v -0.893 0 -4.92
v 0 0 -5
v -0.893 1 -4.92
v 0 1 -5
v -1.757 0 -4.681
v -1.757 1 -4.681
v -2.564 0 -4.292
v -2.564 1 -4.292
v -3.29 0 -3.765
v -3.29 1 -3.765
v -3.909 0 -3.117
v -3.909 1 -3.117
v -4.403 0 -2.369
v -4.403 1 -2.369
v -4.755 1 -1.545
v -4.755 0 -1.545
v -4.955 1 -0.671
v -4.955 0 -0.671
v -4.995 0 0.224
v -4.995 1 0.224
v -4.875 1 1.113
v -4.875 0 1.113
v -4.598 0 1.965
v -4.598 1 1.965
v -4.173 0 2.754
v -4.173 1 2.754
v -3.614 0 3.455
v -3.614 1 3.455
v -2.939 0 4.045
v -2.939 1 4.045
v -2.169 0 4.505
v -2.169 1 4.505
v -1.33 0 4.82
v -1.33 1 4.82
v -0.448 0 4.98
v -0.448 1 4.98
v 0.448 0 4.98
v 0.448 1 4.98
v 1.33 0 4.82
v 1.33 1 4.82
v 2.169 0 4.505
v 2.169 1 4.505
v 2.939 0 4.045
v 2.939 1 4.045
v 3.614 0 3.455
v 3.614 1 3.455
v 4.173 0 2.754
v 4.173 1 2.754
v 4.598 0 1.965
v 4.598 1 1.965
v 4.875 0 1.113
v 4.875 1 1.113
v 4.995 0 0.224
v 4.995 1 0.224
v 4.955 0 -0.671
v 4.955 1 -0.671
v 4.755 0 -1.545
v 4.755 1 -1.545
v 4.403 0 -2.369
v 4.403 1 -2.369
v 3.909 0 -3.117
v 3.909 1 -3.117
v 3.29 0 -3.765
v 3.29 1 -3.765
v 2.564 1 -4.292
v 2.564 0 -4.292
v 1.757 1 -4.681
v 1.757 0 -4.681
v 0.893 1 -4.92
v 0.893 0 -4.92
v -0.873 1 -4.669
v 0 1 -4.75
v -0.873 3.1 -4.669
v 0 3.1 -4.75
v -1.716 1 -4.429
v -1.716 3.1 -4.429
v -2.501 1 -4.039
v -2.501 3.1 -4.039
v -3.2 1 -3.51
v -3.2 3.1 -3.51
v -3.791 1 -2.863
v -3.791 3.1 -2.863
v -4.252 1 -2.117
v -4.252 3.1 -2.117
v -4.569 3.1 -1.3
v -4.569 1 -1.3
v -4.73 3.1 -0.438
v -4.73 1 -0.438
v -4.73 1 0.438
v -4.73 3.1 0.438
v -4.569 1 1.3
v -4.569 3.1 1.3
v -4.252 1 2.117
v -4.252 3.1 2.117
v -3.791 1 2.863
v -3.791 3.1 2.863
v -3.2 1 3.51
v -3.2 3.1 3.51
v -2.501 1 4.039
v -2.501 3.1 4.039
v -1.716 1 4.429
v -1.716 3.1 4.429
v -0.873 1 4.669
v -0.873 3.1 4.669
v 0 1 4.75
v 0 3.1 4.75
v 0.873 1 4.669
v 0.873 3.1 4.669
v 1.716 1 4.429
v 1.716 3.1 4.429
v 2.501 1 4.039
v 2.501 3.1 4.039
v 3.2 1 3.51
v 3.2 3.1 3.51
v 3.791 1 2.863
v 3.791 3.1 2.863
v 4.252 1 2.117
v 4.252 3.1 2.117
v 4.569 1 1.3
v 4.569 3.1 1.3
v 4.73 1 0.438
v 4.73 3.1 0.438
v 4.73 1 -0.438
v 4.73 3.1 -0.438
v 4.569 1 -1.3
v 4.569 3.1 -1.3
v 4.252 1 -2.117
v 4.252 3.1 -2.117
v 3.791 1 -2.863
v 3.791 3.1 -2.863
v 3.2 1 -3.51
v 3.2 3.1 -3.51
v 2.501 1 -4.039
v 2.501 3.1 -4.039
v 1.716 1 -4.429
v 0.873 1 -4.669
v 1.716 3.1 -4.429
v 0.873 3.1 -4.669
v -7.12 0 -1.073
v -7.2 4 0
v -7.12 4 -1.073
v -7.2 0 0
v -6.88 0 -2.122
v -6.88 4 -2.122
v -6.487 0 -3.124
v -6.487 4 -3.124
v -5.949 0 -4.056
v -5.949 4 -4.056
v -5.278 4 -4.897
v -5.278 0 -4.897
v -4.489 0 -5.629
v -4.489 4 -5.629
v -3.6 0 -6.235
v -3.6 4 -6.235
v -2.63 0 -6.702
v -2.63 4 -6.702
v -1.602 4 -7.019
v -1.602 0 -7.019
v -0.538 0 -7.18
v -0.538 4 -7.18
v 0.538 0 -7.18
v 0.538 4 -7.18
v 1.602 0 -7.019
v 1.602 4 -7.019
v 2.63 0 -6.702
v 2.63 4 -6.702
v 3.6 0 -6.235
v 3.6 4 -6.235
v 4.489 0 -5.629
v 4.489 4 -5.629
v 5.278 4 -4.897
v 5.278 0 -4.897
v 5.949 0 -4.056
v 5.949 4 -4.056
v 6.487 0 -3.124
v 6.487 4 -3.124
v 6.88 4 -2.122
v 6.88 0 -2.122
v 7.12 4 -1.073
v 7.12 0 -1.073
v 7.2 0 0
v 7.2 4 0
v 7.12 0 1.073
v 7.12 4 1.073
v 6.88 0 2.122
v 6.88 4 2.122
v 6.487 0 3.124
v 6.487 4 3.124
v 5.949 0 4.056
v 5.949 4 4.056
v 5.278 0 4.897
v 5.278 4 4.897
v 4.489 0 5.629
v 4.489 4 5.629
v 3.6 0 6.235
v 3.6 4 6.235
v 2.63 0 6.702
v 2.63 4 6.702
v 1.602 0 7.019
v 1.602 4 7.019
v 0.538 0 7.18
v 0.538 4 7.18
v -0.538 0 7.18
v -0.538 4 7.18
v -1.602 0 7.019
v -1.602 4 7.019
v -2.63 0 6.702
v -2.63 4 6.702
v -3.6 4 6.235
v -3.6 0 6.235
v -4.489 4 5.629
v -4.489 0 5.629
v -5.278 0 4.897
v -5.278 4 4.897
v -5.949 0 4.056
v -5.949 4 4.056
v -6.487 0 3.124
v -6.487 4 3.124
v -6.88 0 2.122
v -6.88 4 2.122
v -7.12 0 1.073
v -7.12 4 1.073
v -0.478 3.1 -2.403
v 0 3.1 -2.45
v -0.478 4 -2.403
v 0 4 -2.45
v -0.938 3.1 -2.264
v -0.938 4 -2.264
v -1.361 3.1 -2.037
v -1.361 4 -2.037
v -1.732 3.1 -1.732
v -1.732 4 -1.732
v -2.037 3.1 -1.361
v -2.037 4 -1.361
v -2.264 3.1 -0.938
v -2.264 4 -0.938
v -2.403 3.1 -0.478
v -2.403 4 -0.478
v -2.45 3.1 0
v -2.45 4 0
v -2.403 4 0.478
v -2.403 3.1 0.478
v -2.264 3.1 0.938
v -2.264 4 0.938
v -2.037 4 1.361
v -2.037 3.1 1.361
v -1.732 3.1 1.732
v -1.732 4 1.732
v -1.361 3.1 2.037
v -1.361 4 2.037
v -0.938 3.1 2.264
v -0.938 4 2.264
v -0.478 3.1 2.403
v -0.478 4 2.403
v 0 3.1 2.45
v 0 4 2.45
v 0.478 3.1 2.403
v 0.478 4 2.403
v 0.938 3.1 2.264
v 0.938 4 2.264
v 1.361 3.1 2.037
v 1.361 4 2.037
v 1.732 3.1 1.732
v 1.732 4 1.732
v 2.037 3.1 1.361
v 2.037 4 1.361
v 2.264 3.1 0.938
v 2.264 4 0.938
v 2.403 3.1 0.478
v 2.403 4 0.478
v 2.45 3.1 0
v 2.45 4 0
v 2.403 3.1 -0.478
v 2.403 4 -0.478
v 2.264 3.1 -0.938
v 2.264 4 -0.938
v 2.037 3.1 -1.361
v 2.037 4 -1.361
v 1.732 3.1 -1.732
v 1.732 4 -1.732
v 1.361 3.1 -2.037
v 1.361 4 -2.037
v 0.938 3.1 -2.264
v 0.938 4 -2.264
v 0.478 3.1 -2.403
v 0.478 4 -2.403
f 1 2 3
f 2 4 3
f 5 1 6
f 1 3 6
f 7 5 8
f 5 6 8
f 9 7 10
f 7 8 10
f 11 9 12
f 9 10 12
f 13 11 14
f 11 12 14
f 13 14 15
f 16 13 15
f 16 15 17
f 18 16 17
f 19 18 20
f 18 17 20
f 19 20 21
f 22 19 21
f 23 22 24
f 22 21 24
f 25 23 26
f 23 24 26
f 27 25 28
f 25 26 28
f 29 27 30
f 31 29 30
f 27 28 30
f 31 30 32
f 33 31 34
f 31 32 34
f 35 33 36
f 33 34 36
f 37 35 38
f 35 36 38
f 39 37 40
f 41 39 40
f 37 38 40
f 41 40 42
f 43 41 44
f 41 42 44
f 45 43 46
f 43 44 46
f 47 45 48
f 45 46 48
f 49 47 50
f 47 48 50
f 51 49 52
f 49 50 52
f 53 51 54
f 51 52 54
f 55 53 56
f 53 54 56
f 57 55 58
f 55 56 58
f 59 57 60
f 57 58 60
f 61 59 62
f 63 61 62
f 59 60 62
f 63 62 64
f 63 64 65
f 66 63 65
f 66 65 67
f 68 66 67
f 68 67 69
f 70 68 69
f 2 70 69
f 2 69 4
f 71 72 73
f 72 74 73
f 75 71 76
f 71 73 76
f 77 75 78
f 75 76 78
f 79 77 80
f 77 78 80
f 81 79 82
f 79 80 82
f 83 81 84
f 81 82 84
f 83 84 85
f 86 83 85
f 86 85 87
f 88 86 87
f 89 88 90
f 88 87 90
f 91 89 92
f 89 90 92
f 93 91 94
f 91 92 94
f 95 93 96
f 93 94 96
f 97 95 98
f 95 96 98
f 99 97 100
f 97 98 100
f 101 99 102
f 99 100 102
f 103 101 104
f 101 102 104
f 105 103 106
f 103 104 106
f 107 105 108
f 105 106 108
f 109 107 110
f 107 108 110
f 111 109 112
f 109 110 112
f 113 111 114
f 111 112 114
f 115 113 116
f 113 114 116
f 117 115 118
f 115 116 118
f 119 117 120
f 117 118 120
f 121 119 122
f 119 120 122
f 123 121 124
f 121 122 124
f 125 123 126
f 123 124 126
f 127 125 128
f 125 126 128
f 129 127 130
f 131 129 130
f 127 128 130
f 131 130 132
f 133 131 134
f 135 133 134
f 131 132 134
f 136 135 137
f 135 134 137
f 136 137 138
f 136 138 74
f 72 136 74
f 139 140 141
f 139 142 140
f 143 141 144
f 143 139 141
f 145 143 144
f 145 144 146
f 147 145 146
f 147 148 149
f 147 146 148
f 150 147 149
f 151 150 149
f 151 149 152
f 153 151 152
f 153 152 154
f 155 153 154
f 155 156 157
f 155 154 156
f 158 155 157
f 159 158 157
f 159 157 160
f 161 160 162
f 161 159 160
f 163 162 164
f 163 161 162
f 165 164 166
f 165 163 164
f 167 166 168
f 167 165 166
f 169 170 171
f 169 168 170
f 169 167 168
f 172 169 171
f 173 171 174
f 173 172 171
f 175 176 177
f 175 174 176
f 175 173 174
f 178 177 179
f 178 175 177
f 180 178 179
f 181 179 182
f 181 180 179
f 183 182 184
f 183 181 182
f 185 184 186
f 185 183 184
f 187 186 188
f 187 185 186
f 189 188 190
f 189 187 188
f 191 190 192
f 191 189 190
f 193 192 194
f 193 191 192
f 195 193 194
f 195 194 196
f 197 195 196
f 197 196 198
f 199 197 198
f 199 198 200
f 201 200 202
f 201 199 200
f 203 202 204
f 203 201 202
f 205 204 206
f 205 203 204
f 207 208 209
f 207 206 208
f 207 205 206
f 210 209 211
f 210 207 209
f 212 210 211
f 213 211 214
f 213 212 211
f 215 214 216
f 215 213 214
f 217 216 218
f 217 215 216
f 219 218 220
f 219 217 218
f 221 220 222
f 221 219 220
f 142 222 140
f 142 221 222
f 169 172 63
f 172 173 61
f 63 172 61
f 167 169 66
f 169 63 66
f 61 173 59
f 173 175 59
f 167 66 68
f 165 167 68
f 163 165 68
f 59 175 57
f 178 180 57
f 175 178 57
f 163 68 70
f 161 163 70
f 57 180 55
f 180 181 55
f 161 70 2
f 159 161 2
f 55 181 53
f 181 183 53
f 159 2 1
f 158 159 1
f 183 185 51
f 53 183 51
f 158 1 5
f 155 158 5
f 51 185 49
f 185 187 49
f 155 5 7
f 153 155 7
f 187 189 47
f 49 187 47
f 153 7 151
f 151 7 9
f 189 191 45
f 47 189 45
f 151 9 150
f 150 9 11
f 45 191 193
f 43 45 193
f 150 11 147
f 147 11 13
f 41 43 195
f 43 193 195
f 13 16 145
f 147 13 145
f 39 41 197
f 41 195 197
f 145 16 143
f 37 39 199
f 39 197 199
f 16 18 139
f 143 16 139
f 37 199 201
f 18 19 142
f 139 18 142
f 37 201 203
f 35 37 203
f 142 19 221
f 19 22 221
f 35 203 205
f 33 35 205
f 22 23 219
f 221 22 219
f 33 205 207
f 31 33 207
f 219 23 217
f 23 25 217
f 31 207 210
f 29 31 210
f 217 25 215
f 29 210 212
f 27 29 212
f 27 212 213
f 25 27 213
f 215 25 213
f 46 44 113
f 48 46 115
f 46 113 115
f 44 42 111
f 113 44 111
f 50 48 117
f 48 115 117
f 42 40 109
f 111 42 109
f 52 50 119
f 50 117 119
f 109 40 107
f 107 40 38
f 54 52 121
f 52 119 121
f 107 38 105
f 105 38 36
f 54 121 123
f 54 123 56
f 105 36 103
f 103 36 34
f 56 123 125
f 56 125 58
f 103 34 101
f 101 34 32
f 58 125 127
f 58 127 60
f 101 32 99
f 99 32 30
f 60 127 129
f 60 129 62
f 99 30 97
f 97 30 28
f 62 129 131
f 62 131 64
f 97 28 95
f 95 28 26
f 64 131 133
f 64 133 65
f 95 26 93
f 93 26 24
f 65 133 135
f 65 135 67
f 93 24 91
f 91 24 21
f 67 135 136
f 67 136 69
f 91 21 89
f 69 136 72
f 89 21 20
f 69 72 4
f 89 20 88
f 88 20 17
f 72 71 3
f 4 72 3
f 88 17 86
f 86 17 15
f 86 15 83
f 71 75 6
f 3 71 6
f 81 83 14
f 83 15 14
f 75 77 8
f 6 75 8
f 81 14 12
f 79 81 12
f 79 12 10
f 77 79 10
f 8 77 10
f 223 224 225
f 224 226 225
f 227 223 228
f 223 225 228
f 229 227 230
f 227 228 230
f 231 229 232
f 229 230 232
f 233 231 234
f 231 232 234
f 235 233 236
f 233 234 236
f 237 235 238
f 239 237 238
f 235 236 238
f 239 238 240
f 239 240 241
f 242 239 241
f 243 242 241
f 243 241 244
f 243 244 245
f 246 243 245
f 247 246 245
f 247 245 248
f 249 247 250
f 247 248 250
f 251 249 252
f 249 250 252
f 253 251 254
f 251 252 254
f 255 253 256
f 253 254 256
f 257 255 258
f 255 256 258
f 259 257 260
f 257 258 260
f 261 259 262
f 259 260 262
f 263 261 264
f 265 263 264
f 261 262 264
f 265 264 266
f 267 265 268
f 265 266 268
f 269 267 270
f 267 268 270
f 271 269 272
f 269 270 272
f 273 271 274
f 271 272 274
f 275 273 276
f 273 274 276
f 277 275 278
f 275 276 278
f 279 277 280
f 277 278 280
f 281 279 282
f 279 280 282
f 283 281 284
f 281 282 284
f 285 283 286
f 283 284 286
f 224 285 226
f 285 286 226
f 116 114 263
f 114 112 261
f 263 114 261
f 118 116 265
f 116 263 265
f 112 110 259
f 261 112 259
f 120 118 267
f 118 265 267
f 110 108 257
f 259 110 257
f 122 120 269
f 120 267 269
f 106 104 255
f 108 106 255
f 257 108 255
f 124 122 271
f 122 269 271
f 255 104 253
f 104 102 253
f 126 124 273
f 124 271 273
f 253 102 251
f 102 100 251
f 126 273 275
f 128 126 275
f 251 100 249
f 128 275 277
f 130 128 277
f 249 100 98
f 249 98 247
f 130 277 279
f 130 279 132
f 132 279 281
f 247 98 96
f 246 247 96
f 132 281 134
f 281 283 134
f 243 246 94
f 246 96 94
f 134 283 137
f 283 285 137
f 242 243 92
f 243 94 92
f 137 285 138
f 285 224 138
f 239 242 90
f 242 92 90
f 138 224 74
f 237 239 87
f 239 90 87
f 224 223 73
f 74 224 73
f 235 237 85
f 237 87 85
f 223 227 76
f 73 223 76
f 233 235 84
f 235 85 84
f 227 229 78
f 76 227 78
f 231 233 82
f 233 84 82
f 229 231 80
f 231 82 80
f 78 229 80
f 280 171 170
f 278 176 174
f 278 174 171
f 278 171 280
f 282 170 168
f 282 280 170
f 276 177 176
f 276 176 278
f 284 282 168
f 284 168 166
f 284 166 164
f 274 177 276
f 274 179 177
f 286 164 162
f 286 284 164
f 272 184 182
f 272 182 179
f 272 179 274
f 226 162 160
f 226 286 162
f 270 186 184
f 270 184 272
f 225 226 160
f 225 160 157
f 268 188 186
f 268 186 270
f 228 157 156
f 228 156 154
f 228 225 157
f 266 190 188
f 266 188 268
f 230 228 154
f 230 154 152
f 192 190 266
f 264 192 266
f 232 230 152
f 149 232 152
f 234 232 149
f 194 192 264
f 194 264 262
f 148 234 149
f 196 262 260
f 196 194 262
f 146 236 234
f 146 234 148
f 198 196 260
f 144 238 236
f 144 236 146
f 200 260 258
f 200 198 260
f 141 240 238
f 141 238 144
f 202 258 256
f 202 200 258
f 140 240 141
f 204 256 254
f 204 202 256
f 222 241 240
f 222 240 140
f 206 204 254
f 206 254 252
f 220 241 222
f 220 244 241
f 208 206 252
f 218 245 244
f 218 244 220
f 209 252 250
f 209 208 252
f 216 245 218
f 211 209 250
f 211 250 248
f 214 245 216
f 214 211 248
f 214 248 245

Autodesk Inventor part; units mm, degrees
ref_plane "YZ Plane" through (0, 0, 0) normal (1, 0, 0) x (0, 1, 0)
ref_plane "XZ Plane" through (0, 0, 0) normal (0, 1, 0) x (-1, 0, 0)
ref_plane "XY Plane" through (0, 0, 0) normal (0, 0, 1) x (1, 0, 0)
sketch "Sketch1" plane through (0, 0, 0) normal (0, 1, 0) x (-1, 0, 0)
  circle A0 centre (0, 0) radius 7.2
  dimension "d0" = 14.4
extrude "Extrusion1" add sketch "Sketch1" along normal blind 4
hole "Hole1" at (0, 0, 0) direction (0, 1, 0) diameter 4.9 end through all
hole "Hole2" at (0, 0, 0) direction (0, 1, 0) diameter 9.5 depth 3.1
hole "Hole3" at (0, 0, 0) direction (0, 1, 0) diameter 10 depth 1
properties part number "Hitec HS-5245MG gear 5 _2"
